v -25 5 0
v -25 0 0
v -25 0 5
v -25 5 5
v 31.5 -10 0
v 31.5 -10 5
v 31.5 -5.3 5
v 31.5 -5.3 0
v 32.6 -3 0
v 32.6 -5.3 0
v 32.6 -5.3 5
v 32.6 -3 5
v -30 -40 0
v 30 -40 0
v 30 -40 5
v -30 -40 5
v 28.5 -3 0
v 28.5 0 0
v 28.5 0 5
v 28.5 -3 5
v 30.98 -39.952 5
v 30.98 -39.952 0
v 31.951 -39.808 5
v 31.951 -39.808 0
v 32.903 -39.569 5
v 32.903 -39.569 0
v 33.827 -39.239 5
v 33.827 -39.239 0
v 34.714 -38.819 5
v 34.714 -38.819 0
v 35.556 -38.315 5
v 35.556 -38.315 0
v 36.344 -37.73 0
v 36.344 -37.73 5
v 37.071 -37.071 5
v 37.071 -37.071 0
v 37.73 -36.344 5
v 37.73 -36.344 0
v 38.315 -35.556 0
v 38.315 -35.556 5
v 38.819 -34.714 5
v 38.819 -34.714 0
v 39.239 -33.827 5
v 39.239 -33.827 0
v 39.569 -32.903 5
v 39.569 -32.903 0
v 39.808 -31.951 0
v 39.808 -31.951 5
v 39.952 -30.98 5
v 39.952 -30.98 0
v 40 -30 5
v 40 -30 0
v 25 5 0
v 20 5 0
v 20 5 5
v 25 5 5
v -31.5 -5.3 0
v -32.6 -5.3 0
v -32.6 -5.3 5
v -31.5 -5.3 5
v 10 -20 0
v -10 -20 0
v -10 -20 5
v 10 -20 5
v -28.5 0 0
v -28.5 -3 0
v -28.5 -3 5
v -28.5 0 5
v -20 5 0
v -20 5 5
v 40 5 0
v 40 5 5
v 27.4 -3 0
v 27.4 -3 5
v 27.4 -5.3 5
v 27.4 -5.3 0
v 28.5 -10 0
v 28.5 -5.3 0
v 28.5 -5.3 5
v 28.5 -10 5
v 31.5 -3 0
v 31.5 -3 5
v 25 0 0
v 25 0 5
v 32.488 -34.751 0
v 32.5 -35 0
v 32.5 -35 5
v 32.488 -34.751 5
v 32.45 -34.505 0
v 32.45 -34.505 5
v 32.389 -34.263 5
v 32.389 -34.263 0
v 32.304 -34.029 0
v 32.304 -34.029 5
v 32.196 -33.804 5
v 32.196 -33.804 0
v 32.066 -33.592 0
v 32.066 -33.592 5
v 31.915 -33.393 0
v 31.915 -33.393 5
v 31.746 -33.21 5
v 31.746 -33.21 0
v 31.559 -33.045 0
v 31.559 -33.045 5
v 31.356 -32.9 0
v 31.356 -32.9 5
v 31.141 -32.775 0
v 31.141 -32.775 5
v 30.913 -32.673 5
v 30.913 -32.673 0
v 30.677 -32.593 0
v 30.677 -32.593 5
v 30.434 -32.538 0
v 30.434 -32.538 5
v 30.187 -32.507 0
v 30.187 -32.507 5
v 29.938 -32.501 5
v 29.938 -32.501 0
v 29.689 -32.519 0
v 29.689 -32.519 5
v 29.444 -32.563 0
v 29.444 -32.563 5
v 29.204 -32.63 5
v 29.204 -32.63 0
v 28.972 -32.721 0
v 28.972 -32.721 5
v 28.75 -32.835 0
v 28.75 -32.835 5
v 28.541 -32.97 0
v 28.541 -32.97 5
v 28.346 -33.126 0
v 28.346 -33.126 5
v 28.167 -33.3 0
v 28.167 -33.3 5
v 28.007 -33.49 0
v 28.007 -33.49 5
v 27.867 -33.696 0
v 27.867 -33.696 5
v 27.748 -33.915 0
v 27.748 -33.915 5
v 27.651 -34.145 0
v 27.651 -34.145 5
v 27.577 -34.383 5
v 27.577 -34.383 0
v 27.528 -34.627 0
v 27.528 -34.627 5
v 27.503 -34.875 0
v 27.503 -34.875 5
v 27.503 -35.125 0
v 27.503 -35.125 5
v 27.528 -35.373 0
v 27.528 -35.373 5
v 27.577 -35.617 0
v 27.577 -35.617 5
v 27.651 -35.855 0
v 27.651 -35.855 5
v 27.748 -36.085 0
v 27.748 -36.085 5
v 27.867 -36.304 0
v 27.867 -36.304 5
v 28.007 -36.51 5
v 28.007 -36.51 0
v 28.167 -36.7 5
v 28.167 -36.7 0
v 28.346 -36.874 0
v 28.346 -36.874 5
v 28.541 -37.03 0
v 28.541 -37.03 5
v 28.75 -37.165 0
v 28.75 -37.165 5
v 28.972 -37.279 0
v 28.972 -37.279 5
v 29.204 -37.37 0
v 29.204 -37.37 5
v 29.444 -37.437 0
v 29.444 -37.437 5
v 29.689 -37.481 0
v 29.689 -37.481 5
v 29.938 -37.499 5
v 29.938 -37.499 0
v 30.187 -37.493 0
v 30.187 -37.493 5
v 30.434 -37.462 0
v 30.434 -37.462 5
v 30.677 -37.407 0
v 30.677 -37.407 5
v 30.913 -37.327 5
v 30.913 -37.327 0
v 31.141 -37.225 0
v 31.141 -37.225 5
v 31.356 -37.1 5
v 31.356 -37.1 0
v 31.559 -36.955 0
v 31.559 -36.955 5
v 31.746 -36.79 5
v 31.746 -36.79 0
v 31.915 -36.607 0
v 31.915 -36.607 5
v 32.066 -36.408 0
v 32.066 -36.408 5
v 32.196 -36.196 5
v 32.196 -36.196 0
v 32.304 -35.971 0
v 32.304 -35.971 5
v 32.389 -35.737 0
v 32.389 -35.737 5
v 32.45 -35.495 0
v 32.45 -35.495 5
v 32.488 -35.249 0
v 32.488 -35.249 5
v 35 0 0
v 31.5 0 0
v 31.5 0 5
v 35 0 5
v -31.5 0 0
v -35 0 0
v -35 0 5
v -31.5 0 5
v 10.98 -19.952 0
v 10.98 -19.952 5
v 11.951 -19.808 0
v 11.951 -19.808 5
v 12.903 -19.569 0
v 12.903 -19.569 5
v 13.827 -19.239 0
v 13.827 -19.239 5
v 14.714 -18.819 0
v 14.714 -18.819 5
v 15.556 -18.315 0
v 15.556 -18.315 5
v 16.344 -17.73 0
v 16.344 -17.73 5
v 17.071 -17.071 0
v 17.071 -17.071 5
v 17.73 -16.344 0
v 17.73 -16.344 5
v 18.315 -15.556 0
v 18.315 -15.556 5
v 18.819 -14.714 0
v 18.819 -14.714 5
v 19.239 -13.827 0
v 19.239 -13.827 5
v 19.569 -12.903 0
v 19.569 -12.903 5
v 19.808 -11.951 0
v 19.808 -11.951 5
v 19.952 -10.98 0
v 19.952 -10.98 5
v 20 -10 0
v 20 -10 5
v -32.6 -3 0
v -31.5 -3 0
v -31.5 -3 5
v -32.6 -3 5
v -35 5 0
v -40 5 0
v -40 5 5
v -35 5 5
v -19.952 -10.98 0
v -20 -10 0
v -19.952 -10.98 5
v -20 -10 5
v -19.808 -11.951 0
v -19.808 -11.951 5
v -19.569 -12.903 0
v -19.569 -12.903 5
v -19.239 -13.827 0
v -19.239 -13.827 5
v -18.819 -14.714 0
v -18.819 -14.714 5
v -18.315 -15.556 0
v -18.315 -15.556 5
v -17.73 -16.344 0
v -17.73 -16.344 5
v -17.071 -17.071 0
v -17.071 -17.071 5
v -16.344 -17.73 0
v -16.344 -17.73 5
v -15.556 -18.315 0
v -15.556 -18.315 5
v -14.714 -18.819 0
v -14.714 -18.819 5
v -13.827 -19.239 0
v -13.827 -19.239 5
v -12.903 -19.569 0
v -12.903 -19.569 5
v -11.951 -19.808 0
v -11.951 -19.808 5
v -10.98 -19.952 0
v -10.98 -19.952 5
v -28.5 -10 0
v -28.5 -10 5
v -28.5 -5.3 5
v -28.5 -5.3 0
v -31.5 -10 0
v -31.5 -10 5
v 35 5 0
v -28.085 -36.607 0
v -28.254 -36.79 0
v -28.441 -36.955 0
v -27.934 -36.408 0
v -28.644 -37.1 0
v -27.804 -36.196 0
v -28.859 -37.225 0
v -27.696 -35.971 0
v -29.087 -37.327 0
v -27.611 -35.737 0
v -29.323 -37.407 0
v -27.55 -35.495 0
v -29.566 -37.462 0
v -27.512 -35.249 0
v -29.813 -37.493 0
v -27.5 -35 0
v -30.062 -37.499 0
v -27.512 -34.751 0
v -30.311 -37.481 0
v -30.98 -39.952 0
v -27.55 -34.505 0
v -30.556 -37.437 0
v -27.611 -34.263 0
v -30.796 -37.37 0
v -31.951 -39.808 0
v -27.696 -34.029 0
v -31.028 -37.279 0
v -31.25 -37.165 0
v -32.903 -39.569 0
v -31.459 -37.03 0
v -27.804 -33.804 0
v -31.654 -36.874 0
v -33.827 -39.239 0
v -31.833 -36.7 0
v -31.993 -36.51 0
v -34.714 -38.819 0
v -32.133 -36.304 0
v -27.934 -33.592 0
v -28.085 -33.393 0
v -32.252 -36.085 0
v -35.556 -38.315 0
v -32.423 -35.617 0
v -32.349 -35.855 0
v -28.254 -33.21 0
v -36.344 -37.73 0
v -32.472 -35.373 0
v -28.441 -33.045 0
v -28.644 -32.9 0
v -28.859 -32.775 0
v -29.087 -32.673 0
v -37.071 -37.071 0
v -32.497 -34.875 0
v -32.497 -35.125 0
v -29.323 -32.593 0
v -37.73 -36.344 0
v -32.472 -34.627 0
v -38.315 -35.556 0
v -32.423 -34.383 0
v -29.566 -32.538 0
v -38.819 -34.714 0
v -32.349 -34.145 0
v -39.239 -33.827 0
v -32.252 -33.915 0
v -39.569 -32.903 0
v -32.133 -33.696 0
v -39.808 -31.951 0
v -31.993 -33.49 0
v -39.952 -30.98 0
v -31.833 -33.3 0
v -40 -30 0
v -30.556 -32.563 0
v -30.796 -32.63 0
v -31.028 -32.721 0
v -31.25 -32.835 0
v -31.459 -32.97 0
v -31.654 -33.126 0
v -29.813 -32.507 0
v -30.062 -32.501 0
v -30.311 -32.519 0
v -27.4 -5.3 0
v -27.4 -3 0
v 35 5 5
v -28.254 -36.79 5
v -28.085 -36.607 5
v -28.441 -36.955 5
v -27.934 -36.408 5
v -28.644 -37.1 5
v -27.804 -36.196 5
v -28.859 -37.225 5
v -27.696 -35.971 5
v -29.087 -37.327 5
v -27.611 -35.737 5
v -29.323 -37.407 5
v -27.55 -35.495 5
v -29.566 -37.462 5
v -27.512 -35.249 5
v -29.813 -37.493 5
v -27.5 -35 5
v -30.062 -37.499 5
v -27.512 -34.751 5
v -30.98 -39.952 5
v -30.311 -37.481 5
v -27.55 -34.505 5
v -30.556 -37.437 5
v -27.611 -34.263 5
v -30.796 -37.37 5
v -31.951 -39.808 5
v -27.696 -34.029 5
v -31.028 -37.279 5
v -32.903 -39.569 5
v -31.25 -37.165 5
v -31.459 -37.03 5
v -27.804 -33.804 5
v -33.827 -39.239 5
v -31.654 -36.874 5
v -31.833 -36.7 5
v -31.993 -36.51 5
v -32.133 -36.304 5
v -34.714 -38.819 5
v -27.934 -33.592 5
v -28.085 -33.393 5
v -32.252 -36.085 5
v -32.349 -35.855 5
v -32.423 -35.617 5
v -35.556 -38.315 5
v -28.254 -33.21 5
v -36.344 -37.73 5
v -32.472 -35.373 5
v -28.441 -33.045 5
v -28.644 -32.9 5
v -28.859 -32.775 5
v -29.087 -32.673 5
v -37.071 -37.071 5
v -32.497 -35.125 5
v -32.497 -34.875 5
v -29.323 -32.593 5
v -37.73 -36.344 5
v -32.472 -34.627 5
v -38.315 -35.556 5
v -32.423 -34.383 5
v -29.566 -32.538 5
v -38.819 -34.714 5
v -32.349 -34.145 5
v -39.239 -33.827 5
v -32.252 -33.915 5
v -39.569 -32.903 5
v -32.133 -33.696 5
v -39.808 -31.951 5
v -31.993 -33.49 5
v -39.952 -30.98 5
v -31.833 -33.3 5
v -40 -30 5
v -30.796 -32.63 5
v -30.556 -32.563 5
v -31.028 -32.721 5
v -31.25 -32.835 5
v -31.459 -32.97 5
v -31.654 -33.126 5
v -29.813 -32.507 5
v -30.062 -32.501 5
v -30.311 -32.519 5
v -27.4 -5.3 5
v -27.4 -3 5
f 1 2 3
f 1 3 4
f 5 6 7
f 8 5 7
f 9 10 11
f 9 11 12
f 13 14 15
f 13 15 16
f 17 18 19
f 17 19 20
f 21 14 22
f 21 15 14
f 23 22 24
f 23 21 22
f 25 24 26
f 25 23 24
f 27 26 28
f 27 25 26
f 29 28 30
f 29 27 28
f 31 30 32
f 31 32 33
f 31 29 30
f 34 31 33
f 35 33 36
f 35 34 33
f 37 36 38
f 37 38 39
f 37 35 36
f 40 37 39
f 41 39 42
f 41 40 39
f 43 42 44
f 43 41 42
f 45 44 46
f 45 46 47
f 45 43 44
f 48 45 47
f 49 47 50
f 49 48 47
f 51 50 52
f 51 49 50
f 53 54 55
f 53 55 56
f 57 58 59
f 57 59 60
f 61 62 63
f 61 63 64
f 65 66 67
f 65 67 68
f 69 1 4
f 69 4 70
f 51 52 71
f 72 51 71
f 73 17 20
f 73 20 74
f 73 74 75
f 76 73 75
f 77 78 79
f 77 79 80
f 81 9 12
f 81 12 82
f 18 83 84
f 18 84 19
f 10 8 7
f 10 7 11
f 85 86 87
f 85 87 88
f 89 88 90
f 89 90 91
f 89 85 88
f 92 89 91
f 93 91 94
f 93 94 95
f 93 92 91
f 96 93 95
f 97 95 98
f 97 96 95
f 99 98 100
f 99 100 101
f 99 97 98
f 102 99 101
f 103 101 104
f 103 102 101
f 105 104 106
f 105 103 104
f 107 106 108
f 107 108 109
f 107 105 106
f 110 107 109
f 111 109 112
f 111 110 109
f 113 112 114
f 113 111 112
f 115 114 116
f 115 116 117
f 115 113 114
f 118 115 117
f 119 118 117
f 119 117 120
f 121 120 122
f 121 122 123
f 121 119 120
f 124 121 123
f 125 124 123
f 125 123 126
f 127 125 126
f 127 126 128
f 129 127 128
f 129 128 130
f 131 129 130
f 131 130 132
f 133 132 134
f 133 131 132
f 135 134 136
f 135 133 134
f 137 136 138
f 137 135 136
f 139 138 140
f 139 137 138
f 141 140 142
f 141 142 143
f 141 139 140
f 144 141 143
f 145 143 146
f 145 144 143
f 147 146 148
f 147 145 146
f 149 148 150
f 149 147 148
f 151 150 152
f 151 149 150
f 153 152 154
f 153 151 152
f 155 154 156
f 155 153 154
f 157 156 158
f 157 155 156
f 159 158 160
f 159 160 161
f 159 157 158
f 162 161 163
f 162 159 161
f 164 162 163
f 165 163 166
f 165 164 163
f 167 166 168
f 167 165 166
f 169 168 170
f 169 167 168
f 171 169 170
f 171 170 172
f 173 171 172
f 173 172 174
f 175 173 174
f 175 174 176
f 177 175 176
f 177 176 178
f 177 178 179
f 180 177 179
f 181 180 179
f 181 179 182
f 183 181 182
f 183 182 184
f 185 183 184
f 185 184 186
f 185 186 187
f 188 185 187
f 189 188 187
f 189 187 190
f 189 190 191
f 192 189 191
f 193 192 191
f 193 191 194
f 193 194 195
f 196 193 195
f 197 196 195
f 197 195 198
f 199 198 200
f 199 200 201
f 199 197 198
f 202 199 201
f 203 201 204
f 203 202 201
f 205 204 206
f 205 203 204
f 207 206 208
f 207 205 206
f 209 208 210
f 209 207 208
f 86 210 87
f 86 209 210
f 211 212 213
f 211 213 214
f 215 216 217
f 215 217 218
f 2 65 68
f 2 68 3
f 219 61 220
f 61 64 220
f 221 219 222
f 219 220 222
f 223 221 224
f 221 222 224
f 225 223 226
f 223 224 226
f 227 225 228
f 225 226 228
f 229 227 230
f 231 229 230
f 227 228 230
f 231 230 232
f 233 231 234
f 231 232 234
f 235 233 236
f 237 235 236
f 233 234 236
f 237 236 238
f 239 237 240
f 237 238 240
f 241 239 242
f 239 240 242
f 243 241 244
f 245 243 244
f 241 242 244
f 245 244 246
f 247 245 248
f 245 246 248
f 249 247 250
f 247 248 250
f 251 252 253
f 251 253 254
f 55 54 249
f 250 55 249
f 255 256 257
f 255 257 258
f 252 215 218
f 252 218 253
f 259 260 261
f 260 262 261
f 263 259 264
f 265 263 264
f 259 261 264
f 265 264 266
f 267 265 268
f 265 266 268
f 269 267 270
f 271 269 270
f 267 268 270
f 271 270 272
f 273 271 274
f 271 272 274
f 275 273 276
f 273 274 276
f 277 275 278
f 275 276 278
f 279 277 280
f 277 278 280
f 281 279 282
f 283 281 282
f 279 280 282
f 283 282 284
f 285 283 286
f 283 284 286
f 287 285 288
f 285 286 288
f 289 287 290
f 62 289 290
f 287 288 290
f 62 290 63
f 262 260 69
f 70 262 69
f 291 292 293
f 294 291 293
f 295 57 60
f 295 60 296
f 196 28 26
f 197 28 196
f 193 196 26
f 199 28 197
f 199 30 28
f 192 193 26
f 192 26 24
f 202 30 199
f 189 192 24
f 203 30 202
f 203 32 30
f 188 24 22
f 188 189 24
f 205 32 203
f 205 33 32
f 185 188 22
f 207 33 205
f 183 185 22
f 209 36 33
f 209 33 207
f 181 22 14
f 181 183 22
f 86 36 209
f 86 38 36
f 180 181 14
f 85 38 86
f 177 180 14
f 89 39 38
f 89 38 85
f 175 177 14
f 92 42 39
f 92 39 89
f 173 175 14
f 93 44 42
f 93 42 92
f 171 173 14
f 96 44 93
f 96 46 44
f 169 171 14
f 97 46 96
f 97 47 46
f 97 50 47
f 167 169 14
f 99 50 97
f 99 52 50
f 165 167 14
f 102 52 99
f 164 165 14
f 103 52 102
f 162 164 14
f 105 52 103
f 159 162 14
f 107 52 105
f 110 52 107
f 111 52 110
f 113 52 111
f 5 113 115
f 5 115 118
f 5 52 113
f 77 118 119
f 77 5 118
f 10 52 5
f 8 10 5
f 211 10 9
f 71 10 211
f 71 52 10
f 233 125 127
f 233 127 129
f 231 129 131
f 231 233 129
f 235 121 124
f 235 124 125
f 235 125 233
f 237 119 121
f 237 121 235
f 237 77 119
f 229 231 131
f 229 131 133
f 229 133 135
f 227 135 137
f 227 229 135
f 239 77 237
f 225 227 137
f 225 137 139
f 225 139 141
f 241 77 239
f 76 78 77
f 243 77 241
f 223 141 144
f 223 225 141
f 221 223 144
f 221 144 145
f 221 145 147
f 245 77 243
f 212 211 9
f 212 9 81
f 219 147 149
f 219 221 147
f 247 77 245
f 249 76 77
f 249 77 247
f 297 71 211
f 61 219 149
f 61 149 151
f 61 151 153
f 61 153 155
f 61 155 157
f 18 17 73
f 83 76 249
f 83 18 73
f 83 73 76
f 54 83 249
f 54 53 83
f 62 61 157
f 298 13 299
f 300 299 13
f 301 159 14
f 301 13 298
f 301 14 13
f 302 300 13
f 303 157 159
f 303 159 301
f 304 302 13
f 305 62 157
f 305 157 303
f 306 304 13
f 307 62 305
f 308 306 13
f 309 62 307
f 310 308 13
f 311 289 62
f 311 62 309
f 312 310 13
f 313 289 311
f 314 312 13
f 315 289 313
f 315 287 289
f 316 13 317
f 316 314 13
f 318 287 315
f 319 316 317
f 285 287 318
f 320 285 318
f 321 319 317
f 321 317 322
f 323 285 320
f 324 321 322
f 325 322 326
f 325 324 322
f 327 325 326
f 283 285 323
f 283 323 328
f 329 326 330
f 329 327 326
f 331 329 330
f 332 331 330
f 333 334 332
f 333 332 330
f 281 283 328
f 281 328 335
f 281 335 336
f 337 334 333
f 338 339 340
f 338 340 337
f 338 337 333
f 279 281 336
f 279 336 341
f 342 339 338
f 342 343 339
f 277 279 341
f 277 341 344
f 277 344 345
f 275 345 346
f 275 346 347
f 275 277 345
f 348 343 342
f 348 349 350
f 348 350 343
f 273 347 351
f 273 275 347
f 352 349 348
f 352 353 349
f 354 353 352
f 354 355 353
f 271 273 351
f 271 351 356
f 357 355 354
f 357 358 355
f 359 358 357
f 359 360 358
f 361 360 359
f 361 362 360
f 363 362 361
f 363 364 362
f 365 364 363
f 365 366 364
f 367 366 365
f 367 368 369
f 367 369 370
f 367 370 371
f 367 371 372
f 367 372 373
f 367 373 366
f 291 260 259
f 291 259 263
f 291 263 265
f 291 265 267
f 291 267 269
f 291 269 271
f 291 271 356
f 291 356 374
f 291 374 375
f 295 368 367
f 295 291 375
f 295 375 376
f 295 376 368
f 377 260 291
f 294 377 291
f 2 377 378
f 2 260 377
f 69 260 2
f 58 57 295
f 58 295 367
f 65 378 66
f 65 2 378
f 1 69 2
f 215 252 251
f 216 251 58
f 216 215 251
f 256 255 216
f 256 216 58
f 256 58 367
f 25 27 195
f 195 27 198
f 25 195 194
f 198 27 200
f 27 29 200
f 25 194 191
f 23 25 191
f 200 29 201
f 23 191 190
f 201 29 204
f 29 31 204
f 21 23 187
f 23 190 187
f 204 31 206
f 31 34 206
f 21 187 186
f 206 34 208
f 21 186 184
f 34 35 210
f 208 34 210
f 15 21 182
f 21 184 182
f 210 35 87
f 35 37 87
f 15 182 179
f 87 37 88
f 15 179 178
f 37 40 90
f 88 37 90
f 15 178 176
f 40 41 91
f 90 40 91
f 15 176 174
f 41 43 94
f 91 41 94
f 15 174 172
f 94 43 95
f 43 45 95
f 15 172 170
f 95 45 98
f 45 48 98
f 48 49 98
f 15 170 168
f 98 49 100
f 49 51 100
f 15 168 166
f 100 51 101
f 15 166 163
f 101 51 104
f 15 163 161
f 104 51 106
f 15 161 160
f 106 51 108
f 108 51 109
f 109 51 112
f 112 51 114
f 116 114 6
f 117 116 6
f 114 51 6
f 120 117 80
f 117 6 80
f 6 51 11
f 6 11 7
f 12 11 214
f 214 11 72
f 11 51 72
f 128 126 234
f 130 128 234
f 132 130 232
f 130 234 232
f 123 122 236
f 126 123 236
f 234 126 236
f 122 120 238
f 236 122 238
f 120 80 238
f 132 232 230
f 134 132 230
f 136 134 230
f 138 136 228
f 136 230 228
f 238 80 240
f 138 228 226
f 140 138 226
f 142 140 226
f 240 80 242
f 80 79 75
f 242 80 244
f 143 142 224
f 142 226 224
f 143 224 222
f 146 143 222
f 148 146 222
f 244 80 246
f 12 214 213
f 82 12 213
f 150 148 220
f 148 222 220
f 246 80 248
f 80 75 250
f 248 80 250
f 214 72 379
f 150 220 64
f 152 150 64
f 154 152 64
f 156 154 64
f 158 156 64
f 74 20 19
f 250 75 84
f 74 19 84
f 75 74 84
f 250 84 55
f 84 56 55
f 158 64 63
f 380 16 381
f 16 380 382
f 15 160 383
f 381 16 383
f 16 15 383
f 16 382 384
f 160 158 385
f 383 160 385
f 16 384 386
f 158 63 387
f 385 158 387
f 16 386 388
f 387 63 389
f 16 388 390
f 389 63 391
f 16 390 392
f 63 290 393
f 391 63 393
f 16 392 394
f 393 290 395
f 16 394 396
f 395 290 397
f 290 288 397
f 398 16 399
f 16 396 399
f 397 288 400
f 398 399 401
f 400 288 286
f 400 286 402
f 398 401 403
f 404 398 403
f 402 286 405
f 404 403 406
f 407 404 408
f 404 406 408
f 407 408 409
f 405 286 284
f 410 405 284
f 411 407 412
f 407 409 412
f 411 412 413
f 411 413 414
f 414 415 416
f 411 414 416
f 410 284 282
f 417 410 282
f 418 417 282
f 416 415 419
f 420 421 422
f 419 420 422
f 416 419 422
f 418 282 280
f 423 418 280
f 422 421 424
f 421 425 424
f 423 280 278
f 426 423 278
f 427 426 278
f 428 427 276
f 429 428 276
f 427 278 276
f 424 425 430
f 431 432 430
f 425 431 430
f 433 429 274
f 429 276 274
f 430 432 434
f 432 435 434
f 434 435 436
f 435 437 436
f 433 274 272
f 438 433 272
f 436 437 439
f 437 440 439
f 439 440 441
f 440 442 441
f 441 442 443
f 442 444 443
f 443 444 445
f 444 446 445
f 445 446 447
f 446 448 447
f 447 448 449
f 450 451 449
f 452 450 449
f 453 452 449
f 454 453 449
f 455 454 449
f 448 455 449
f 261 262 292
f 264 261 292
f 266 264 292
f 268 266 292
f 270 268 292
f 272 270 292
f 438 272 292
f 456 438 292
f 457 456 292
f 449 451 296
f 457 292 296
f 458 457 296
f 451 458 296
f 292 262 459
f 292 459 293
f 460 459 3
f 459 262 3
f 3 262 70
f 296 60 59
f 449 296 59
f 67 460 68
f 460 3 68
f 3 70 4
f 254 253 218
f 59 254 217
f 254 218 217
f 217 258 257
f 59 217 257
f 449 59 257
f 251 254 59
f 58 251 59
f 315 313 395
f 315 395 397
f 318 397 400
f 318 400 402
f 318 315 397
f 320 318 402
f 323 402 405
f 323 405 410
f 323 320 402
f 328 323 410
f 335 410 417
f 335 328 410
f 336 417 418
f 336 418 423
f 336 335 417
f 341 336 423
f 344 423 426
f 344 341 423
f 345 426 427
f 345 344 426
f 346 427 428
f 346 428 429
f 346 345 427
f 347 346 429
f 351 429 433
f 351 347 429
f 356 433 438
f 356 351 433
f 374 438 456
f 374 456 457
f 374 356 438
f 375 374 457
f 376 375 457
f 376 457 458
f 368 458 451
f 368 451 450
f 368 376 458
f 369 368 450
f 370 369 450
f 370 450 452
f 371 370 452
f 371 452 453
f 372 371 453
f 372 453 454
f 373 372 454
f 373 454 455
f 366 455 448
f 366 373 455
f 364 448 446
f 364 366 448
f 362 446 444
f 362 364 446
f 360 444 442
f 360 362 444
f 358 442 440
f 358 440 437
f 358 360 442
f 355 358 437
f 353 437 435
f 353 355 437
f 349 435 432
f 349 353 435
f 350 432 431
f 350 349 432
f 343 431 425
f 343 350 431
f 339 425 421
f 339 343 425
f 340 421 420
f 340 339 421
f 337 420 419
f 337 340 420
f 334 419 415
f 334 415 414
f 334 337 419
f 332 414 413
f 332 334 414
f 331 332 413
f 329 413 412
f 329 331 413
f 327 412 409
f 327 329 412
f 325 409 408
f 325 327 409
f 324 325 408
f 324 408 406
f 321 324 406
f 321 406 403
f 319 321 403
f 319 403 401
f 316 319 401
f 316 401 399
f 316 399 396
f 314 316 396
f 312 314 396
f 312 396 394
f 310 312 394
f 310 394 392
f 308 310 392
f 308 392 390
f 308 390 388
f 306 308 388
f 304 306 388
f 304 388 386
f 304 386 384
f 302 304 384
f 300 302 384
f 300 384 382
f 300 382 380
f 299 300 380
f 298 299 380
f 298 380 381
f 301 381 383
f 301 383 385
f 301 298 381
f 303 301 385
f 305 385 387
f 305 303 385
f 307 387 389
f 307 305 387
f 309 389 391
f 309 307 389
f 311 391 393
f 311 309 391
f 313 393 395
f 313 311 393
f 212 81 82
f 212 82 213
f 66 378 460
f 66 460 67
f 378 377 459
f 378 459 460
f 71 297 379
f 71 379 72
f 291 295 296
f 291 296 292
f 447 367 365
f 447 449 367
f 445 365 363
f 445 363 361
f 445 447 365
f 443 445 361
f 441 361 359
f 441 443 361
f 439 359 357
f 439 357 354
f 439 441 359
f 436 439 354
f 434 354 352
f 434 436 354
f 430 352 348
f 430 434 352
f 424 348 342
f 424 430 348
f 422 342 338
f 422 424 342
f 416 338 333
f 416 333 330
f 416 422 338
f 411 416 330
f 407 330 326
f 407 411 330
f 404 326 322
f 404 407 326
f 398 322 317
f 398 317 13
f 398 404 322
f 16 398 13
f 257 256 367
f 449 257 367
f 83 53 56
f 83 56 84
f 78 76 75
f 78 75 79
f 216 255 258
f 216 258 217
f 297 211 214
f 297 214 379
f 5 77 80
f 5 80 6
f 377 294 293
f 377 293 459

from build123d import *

# Parameters (mm, degrees)
ESQUISSE1_R        = 2.5
BOSS_EXTRU_1_DEPTH = 5
CONG_1_R           = 10


with BuildPart() as part:
    # Esquisse1 → Boss.-Extru.1 (new body)
    with BuildSketch(Plane.XY):
        Polygon((-31.5, -3), (-32.6, -3), (-32.6, -5.3), (-31.5, -5.3), (-31.5, -10), (-28.5, -10), (-28.5, -5.3), (-27.4, -5.3), (-27.4, -3), (-28.5, -3), (-28.5, 0), (-25, 0), (-25, 5), (-20, 5), (-20, 0), (-20, -20), (20, -20), (20, 0), (20, 5), (25, 5), (25, 0), (28.5, 0), (28.5, -3), (27.4, -3), (27.4, -5.3), (28.5, -5.3), (28.5, -10), (31.5, -10), (31.5, -5.3), (32.6, -5.3), (32.6, -3), (31.5, -3), (31.5, 0), (35, 0), (35, 5), (40, 5), (40, 0), (40, -40), (-40, -40), (-40, 0), (-40, 5), (-35, 5), (-35, 0), (-31.5, 0), align=None)
        with Locations((30, -35)):
            Circle(ESQUISSE1_R, mode=Mode.SUBTRACT)
        with Locations((-30, -35)):
            Circle(ESQUISSE1_R, mode=Mode.SUBTRACT)
    extrude(amount=BOSS_EXTRU_1_DEPTH)

    # Congé1
    cong_1_edges = [part.edges().sort_by_distance(p)[0] for p in [
        (-20, -20, 2.5),
        (20, -20, 2.5),
        (40, -40, 2.5),
        (-40, -40, 2.5),
    ]]
    fillet(cong_1_edges, radius=CONG_1_R)


solid = part.part
